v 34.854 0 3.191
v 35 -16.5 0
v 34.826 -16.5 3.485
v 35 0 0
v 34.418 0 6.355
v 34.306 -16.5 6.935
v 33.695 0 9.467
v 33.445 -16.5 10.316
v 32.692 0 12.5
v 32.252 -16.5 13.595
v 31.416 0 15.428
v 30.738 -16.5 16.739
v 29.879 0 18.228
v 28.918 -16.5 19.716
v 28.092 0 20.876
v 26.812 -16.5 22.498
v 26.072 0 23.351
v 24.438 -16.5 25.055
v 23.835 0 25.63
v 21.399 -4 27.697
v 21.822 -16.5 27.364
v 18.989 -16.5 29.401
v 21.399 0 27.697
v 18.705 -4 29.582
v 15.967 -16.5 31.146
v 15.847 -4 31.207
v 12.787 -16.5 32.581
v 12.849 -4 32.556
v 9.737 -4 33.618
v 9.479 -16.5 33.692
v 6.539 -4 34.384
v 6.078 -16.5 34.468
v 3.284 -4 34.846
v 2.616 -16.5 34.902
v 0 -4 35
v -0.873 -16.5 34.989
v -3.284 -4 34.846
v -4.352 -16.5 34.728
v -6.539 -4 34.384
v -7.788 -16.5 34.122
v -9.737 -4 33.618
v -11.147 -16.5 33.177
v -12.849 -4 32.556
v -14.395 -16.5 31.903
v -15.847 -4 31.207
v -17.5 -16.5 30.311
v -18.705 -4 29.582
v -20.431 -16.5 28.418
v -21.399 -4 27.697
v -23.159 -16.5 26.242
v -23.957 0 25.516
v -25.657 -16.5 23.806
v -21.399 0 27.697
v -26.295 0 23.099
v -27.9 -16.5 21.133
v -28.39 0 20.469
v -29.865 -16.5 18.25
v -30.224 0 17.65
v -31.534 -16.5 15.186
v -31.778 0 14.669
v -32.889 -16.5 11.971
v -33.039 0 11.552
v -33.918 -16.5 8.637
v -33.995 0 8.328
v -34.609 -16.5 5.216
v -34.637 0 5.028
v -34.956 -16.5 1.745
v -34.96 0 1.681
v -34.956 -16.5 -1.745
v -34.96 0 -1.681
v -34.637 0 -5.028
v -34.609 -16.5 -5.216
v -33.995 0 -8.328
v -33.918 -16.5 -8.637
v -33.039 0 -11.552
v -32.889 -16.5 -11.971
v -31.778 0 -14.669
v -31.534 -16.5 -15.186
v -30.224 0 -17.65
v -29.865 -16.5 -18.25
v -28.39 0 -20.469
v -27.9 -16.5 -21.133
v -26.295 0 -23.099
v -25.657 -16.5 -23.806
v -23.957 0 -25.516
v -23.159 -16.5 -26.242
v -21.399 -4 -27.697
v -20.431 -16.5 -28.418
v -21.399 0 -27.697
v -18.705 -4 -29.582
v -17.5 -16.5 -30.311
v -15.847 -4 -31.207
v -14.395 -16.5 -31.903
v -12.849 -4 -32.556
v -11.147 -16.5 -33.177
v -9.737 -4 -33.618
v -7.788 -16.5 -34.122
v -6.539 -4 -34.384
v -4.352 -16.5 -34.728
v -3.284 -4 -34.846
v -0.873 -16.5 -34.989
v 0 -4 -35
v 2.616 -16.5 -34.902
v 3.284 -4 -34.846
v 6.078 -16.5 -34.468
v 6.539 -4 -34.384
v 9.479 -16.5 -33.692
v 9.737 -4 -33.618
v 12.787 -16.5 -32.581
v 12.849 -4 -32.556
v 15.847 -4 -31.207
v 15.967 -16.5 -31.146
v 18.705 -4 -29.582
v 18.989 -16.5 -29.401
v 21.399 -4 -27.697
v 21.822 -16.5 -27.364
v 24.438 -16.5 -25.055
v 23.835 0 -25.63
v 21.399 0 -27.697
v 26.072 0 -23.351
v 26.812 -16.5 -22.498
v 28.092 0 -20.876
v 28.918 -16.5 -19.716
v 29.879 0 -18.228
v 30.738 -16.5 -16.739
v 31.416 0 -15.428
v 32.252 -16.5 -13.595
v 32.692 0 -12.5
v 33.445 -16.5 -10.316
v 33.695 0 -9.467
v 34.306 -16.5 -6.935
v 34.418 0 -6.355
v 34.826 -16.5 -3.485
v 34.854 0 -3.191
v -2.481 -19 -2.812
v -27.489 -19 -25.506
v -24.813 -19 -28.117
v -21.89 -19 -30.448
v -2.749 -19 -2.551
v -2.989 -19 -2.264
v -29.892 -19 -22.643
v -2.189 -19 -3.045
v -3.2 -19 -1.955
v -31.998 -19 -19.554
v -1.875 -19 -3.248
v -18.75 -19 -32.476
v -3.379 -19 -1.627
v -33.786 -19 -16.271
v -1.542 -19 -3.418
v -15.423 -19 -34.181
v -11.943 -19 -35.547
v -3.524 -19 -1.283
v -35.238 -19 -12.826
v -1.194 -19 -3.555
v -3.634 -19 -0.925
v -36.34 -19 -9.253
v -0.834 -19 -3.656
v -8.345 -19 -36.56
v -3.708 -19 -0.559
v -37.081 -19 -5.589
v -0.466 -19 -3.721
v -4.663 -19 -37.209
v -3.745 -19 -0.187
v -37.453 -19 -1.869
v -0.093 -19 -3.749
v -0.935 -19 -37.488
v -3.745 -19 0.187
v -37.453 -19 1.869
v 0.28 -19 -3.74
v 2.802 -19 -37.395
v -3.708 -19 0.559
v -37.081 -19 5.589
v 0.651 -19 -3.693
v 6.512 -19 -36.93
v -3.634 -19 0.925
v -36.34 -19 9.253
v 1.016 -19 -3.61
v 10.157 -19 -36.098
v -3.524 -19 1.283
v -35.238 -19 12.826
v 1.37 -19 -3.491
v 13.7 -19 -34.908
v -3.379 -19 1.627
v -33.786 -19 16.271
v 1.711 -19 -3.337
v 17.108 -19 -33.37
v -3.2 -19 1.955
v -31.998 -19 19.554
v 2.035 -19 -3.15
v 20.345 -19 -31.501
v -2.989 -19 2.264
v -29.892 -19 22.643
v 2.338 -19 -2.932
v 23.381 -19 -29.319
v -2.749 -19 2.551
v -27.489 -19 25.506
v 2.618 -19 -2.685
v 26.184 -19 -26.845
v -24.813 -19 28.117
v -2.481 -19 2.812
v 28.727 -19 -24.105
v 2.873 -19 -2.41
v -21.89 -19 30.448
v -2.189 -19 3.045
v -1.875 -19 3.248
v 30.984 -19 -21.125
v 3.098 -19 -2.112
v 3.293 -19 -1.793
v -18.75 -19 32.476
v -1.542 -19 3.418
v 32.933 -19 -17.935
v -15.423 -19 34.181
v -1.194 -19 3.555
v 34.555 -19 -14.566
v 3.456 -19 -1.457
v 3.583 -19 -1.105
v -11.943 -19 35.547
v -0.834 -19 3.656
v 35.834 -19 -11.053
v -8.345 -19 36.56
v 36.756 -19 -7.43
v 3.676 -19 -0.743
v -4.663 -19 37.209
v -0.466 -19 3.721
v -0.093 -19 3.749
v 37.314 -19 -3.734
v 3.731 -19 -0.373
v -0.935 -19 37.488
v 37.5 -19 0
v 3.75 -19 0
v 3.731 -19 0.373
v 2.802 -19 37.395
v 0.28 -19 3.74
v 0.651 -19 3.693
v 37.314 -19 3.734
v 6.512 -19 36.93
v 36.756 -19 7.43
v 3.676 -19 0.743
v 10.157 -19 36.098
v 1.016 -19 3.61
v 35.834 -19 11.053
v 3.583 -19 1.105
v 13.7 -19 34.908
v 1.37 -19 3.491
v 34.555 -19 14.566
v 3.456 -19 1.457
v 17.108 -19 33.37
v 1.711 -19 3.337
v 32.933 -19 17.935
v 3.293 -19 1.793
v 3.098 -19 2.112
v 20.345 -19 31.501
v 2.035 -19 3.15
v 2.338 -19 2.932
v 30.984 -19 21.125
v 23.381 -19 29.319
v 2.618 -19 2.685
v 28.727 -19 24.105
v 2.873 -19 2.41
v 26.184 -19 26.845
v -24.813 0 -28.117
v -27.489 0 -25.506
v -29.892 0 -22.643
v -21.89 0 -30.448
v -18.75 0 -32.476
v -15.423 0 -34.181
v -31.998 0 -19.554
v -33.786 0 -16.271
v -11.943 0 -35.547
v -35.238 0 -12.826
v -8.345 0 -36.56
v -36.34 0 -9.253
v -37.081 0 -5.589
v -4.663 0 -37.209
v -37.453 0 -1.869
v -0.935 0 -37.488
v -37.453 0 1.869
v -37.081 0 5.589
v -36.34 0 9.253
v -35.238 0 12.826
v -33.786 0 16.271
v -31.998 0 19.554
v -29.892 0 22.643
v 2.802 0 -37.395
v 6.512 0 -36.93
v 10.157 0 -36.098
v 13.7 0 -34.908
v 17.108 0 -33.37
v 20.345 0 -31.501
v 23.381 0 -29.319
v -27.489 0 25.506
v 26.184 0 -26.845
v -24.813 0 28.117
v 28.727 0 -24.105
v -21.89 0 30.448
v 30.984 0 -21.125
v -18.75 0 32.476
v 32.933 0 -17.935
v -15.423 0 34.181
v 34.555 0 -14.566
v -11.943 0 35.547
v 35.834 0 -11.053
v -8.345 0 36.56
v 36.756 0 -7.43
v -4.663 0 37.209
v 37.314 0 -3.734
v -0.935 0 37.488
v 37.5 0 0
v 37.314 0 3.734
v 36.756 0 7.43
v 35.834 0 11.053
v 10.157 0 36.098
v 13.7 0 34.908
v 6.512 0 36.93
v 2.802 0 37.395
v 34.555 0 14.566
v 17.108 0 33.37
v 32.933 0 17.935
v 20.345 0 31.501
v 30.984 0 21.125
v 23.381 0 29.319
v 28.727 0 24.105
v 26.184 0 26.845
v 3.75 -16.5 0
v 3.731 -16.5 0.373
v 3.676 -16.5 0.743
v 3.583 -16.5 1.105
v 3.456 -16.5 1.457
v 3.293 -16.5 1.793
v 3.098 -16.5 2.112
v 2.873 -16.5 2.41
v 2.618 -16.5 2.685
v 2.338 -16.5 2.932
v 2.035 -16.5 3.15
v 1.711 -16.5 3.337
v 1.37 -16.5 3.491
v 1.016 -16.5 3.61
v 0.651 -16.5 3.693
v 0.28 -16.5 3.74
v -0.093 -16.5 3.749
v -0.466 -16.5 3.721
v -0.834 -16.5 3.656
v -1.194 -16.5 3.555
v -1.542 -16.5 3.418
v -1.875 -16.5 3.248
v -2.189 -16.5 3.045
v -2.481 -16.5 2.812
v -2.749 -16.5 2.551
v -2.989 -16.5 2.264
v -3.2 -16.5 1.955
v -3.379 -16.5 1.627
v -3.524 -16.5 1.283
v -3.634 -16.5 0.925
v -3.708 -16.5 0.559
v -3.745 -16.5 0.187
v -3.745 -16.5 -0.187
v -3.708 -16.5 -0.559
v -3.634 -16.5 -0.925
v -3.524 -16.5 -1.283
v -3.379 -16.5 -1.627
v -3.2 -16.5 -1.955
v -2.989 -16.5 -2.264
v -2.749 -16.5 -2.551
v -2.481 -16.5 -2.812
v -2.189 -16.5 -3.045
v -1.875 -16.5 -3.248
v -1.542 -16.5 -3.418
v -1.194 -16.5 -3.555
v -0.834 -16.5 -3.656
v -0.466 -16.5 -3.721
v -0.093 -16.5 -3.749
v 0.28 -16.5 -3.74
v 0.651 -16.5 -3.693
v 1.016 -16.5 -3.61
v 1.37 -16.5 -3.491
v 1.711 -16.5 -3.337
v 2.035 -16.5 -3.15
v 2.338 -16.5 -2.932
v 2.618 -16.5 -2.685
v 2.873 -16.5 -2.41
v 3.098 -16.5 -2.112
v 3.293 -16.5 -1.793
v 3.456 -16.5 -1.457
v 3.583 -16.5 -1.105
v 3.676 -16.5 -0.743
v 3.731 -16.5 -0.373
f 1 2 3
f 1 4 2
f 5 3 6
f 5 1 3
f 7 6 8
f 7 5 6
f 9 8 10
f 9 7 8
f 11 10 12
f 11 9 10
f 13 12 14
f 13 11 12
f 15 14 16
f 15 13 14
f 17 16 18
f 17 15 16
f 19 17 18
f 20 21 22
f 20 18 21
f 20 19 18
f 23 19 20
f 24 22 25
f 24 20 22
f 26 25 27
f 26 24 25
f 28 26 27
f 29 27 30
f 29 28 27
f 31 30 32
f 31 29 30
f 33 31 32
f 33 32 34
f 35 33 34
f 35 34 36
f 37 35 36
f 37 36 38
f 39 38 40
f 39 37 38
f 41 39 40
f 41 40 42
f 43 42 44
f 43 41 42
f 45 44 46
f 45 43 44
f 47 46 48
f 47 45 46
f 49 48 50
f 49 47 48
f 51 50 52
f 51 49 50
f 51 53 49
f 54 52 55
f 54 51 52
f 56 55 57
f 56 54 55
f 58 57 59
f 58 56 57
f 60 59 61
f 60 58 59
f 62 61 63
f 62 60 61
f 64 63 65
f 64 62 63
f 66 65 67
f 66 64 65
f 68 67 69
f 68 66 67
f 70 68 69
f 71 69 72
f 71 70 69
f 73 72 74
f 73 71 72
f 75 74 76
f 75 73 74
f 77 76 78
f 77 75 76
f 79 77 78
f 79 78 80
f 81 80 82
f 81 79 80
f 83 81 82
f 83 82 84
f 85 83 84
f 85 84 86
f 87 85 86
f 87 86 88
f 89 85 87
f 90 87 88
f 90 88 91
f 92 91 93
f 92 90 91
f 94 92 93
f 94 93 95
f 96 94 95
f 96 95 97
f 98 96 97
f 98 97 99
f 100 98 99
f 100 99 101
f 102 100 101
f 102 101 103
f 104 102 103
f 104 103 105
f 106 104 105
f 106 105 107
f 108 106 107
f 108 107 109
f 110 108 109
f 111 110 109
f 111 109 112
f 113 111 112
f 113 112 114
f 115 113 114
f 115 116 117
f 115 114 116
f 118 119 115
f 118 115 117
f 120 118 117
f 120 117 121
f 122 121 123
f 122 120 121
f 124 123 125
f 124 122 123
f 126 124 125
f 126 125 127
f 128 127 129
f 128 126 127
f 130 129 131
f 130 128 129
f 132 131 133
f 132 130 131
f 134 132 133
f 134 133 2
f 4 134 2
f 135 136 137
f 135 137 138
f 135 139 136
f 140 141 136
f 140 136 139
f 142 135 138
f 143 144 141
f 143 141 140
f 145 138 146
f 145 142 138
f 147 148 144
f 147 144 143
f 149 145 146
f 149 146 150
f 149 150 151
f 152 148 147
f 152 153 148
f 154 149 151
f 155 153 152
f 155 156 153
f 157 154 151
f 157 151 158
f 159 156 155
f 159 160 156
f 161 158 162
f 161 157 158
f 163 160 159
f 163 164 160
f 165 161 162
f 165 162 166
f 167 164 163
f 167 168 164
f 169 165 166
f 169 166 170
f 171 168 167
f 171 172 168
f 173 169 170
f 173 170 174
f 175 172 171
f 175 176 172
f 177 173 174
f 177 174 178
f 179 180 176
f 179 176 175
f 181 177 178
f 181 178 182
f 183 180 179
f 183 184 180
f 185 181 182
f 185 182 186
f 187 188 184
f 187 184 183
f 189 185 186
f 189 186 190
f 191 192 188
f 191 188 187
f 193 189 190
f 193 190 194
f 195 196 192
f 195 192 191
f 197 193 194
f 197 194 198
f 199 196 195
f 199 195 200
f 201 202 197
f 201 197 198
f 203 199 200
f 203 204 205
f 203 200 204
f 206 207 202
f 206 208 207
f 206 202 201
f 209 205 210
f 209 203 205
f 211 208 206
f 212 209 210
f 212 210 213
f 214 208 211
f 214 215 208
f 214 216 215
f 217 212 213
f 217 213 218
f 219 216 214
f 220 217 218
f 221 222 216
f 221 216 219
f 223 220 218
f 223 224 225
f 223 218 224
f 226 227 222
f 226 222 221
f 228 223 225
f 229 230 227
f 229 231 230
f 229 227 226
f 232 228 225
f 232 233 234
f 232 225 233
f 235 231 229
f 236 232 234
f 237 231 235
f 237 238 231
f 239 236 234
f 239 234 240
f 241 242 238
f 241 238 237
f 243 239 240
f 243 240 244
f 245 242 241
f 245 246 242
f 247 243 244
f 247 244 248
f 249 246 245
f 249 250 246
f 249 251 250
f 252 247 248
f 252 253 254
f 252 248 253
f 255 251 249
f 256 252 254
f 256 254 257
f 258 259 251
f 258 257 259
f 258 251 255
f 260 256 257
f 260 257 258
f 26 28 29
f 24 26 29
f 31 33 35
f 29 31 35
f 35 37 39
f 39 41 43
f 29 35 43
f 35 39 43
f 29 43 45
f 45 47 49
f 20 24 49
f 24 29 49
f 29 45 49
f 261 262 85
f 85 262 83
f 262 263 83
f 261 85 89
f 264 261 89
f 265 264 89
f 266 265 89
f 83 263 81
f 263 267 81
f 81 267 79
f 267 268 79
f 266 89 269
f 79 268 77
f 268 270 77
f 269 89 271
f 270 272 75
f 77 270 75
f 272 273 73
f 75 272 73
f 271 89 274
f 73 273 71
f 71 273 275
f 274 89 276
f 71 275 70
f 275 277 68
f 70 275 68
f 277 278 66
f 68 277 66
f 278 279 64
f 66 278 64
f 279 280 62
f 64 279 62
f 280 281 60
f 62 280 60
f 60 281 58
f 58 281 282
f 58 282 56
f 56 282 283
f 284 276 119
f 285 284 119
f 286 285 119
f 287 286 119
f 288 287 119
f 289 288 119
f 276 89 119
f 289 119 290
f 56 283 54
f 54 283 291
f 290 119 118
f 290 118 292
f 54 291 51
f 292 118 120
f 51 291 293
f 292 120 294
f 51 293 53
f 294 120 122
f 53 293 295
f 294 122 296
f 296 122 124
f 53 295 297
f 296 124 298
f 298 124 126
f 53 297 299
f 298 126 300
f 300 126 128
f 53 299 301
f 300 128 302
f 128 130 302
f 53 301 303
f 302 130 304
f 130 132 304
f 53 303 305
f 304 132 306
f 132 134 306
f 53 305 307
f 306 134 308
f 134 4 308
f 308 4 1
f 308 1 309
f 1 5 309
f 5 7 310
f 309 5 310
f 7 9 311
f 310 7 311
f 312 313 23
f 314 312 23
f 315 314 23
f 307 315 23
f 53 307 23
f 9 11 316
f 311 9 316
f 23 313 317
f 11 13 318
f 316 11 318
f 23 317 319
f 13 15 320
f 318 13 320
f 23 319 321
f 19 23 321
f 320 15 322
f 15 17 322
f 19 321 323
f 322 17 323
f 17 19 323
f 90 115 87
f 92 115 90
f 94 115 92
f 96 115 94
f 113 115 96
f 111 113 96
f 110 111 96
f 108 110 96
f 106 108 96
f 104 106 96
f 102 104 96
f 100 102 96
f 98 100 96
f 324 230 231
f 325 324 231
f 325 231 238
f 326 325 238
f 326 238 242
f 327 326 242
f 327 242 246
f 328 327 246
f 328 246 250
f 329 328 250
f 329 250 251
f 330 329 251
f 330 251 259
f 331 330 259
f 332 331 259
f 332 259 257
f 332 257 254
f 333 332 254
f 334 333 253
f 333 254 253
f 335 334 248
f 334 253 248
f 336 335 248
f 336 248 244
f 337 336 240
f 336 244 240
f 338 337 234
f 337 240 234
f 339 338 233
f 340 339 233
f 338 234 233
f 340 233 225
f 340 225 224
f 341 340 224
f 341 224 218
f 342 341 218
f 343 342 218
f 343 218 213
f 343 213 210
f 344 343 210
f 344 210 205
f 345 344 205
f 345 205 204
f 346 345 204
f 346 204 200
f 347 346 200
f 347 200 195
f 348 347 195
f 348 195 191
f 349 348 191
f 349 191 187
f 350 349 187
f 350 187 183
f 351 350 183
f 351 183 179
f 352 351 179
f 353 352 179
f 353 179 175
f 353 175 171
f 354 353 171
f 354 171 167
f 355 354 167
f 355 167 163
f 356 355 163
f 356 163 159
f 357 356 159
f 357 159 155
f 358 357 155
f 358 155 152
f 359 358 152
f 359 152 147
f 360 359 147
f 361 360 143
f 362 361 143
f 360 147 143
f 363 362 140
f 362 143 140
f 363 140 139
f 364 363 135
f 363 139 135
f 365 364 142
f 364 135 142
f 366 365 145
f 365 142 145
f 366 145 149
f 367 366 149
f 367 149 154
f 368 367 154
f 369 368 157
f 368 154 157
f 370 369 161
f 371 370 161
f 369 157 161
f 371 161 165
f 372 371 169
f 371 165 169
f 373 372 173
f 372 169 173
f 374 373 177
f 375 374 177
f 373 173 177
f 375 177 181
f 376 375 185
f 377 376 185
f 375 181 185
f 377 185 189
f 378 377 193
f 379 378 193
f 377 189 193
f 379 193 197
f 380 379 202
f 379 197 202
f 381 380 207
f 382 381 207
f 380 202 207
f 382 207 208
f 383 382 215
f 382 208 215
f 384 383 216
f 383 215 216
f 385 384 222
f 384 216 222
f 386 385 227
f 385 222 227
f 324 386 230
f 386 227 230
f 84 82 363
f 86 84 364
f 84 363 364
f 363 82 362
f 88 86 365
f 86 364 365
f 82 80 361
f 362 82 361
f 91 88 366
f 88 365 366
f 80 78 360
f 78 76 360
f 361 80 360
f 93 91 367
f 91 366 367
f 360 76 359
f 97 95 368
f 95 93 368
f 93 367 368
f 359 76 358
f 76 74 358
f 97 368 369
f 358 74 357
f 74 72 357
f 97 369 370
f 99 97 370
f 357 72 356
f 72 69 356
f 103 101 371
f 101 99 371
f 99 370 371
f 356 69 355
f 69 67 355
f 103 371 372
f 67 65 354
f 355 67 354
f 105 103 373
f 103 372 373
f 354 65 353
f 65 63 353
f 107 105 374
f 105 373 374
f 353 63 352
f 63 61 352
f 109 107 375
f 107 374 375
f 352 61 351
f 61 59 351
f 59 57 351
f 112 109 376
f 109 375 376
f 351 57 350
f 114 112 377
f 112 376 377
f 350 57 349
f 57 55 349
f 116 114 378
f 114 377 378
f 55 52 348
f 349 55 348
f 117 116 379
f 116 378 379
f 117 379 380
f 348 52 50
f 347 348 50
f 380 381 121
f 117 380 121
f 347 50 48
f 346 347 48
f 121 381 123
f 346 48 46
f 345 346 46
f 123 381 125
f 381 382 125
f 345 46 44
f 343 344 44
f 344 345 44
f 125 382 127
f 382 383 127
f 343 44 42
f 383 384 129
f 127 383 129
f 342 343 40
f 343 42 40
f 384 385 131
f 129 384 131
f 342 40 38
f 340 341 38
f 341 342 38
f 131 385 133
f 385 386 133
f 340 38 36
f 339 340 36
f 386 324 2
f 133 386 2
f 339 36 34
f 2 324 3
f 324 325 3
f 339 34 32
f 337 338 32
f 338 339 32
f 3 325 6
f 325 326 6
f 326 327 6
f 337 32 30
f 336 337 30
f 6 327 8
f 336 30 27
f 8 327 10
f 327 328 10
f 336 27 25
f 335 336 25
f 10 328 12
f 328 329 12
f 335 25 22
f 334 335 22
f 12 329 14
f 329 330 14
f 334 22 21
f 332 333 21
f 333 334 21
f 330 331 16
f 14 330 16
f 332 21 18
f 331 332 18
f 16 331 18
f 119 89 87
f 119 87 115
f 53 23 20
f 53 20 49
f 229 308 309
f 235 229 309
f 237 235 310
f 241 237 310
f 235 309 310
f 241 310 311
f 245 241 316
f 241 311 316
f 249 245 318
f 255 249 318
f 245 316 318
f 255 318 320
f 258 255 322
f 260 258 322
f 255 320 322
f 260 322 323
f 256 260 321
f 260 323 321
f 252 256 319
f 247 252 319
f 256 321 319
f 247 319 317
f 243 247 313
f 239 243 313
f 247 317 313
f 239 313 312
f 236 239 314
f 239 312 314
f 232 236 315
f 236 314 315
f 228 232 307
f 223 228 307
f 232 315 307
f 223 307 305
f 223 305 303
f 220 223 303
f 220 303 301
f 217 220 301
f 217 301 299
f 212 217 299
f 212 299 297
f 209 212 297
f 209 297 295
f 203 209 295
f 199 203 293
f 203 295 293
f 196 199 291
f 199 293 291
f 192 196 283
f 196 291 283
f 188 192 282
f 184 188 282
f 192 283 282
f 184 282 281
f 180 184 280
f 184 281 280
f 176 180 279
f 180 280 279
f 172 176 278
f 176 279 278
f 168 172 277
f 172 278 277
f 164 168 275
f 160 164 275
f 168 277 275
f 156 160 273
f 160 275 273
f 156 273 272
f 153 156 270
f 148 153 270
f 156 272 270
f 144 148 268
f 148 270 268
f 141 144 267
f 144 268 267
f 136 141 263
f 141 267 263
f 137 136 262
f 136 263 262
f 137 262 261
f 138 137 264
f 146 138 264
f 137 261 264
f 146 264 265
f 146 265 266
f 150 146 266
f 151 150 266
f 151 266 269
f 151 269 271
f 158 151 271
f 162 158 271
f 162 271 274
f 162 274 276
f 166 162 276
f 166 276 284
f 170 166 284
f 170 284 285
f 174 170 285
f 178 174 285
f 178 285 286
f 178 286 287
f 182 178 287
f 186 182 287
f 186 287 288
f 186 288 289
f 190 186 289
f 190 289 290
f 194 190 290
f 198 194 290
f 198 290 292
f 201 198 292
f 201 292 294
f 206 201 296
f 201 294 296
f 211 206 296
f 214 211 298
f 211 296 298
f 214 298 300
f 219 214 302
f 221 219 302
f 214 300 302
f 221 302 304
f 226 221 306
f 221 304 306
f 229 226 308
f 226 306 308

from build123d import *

# Parameters (mm, degrees)
F0_R     = 37.5
F1_DEPTH = 19
F2_T     = -2.5
F3_R     = 3.75
F4_DEPTH = 19.001
F6_DEPTH = 4
F8_DEPTH = 4


with BuildPart() as f1:
    # F0 (on Front) → F1 (new body)
    with BuildSketch(Plane.XZ):
        Circle(F0_R)
    extrude(amount=F1_DEPTH)

    # F2
    f2_openings = [f1.faces().sort_by_distance(p)[0] for p in [
        (0, 0, 0),
    ]]
    offset(amount=F2_T, openings=f2_openings)

    # F3 (on face) → F4 (cut, through all)
    with BuildSketch(Plane.XZ.offset(19)):
        Circle(F3_R)
    extrude(amount=-F4_DEPTH, mode=Mode.SUBTRACT)

    # F5 (on face) → F6 (join)
    with BuildSketch(Plane(origin=(0, 0, 0), x_dir=(-1, 0, 0), z_dir=(0, 1, 0))):
        with BuildLine():
            ThreePointArc((21.3985376308, 27.696616892), (0, 35), (-21.3985376308, 27.696616892))
            Line((-21.3985376308, 27.696616892), (21.3985376308, 27.696616892))
        make_face()
    extrude(amount=-F6_DEPTH)

    # F7 (on face) → F8 (join)
    with BuildSketch(Plane(origin=(0, 0, 0), x_dir=(-1, 0, 0), z_dir=(0, 1, 0))):
        with BuildLine():
            Line((21.3985376308, -27.696616892), (-21.3985376308, -27.696616892))
            ThreePointArc((-21.3985376308, -27.696616892), (0, -35), (21.3985376308, -27.696616892))
        make_face()
    extrude(amount=-F8_DEPTH)


solid = f1.part
